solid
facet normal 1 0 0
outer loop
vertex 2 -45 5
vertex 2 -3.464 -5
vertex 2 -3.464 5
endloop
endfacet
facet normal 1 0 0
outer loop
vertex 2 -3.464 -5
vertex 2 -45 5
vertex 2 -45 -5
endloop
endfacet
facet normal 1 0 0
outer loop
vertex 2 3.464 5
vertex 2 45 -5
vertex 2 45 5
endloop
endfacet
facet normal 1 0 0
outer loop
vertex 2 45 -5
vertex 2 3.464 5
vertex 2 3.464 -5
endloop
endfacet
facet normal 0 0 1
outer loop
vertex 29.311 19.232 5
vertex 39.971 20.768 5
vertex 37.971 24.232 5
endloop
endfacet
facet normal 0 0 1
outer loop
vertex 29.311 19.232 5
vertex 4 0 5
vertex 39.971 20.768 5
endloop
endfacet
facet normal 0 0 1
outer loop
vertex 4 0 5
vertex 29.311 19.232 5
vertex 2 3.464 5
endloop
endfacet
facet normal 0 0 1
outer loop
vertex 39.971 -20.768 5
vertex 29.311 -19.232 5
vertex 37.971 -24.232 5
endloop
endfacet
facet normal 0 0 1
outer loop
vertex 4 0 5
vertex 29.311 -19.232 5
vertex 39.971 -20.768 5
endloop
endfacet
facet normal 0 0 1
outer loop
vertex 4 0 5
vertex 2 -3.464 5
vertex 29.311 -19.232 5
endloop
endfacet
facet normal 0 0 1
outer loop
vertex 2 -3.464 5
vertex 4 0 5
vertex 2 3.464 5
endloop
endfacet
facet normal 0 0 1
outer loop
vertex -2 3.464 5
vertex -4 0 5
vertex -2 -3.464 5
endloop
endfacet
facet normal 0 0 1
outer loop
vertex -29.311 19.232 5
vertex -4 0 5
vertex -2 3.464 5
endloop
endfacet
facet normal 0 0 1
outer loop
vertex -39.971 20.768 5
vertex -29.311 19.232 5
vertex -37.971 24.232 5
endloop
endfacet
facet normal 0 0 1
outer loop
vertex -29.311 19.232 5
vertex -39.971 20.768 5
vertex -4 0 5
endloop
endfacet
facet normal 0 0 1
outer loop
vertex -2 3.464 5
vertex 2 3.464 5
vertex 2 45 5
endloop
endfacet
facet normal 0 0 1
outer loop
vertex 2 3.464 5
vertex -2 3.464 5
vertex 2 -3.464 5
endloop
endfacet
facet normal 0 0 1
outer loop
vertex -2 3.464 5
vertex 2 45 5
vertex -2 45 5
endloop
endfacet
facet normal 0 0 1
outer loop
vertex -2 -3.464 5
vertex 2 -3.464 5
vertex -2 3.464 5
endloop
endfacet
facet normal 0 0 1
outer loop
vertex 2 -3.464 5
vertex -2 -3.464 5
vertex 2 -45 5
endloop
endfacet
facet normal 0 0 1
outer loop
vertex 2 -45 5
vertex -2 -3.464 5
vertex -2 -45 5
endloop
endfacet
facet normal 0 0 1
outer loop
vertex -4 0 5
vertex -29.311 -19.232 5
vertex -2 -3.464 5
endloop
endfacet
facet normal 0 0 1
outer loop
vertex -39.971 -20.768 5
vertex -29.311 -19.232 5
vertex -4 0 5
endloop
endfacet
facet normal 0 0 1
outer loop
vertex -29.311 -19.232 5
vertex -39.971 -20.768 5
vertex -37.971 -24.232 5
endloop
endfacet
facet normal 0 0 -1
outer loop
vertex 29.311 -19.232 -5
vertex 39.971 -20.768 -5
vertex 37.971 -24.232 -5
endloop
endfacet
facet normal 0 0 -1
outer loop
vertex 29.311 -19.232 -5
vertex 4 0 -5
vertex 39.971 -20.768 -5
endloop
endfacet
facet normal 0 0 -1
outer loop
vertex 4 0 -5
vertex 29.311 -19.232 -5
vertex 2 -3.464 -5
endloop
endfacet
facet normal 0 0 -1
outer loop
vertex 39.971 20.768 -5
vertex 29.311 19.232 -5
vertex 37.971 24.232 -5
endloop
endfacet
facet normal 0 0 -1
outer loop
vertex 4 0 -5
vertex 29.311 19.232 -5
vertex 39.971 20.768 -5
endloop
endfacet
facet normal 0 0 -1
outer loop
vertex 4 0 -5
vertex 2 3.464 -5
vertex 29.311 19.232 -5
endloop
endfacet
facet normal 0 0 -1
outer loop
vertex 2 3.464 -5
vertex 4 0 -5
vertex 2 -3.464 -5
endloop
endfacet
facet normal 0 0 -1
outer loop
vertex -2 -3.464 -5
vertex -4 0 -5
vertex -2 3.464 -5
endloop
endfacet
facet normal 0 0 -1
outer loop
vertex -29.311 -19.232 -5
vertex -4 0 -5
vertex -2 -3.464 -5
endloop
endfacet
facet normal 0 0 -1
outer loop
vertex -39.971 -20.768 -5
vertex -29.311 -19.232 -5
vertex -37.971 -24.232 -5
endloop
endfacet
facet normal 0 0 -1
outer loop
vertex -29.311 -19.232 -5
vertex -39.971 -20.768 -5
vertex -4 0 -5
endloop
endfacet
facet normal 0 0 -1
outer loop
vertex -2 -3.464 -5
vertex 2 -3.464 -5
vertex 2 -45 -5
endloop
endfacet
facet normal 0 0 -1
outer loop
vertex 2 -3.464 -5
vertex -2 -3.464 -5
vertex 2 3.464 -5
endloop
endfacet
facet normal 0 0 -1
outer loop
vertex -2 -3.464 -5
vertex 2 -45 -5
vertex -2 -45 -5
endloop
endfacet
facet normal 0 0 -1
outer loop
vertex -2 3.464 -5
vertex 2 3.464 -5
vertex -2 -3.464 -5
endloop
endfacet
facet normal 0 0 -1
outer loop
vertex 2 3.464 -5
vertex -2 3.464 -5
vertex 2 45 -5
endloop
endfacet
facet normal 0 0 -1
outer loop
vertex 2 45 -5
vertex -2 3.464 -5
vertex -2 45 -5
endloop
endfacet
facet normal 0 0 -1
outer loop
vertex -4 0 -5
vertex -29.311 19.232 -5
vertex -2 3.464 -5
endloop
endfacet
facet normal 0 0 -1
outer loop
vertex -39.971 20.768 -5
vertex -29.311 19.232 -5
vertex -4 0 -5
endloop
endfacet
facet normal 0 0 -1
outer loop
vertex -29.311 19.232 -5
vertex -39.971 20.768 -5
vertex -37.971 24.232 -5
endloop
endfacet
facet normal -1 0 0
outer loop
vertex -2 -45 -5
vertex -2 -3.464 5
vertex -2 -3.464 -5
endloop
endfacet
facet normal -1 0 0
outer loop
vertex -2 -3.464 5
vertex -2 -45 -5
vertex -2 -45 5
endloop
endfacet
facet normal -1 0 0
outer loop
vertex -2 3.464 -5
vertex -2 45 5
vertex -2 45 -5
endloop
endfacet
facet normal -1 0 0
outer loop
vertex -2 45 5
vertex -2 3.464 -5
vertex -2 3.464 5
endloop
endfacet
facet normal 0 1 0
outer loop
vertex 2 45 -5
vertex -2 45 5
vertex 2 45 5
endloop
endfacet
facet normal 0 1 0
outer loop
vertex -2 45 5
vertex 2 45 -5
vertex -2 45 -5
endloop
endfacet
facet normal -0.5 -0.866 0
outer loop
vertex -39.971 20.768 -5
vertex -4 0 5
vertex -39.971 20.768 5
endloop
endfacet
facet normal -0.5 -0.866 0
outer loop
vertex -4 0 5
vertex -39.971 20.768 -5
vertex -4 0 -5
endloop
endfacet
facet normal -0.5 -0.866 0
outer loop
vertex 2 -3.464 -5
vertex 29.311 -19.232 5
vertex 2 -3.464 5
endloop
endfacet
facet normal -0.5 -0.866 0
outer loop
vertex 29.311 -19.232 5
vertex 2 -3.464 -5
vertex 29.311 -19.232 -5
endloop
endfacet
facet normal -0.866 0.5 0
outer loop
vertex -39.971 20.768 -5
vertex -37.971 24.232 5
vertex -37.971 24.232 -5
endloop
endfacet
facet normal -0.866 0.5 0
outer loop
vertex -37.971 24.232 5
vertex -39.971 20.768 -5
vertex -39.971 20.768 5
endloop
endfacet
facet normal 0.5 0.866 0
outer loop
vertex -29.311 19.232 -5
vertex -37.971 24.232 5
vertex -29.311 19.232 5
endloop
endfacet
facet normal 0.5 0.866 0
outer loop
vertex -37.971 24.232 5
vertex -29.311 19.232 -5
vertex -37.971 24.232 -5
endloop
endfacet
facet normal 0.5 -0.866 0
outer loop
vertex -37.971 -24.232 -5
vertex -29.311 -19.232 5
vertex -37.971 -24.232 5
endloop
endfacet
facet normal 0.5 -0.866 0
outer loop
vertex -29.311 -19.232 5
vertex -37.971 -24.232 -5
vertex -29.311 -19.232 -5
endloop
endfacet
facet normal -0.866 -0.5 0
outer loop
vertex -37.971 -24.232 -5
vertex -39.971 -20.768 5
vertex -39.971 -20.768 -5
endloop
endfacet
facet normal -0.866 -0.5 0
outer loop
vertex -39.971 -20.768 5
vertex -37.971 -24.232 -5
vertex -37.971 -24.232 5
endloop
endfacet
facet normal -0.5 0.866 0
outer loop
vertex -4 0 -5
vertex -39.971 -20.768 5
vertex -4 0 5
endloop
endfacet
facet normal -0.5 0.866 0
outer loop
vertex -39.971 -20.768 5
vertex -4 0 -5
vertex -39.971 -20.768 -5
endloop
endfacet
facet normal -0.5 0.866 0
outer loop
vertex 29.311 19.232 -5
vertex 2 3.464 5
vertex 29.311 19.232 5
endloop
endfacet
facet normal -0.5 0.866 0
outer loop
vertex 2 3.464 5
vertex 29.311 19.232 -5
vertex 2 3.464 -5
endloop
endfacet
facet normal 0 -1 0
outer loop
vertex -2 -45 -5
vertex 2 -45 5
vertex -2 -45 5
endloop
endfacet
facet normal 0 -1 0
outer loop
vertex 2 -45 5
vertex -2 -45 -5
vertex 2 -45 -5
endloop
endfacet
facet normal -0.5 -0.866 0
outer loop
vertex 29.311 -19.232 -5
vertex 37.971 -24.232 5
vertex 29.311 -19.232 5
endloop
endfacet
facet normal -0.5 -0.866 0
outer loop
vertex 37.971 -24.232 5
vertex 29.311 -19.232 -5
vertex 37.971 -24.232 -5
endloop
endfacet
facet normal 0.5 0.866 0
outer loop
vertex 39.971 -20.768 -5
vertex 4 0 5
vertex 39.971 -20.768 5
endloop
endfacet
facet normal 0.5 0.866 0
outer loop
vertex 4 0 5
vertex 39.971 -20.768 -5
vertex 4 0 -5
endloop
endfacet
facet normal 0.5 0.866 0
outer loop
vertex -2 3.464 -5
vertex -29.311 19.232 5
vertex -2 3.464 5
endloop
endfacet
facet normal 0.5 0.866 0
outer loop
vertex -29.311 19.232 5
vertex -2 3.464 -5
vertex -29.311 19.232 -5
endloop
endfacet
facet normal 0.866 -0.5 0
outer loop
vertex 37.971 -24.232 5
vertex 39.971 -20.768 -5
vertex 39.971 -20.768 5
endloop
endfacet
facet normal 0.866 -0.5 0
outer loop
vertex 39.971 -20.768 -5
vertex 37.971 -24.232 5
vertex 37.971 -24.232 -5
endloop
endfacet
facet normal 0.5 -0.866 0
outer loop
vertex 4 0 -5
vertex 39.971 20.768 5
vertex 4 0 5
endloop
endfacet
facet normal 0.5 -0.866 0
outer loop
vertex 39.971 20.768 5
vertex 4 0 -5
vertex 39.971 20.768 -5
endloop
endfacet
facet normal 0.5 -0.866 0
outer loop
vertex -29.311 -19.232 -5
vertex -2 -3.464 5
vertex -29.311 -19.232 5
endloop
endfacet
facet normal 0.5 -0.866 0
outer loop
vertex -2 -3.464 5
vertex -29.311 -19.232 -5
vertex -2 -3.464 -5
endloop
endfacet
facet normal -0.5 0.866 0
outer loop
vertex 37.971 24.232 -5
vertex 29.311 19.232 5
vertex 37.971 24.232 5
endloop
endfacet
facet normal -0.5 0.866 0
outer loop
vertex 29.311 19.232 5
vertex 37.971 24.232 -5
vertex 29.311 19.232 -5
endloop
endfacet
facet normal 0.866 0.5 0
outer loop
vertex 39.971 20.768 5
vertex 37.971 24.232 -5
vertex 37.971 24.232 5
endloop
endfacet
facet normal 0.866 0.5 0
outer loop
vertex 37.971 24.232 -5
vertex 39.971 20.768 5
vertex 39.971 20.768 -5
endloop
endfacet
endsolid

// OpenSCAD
for ( i = [0 : 5] )
{
    rotate( i * 360 / 6, [0, 0, 1])
	translate([0,5,0])cube([4,80,10], center = true);
    
}
